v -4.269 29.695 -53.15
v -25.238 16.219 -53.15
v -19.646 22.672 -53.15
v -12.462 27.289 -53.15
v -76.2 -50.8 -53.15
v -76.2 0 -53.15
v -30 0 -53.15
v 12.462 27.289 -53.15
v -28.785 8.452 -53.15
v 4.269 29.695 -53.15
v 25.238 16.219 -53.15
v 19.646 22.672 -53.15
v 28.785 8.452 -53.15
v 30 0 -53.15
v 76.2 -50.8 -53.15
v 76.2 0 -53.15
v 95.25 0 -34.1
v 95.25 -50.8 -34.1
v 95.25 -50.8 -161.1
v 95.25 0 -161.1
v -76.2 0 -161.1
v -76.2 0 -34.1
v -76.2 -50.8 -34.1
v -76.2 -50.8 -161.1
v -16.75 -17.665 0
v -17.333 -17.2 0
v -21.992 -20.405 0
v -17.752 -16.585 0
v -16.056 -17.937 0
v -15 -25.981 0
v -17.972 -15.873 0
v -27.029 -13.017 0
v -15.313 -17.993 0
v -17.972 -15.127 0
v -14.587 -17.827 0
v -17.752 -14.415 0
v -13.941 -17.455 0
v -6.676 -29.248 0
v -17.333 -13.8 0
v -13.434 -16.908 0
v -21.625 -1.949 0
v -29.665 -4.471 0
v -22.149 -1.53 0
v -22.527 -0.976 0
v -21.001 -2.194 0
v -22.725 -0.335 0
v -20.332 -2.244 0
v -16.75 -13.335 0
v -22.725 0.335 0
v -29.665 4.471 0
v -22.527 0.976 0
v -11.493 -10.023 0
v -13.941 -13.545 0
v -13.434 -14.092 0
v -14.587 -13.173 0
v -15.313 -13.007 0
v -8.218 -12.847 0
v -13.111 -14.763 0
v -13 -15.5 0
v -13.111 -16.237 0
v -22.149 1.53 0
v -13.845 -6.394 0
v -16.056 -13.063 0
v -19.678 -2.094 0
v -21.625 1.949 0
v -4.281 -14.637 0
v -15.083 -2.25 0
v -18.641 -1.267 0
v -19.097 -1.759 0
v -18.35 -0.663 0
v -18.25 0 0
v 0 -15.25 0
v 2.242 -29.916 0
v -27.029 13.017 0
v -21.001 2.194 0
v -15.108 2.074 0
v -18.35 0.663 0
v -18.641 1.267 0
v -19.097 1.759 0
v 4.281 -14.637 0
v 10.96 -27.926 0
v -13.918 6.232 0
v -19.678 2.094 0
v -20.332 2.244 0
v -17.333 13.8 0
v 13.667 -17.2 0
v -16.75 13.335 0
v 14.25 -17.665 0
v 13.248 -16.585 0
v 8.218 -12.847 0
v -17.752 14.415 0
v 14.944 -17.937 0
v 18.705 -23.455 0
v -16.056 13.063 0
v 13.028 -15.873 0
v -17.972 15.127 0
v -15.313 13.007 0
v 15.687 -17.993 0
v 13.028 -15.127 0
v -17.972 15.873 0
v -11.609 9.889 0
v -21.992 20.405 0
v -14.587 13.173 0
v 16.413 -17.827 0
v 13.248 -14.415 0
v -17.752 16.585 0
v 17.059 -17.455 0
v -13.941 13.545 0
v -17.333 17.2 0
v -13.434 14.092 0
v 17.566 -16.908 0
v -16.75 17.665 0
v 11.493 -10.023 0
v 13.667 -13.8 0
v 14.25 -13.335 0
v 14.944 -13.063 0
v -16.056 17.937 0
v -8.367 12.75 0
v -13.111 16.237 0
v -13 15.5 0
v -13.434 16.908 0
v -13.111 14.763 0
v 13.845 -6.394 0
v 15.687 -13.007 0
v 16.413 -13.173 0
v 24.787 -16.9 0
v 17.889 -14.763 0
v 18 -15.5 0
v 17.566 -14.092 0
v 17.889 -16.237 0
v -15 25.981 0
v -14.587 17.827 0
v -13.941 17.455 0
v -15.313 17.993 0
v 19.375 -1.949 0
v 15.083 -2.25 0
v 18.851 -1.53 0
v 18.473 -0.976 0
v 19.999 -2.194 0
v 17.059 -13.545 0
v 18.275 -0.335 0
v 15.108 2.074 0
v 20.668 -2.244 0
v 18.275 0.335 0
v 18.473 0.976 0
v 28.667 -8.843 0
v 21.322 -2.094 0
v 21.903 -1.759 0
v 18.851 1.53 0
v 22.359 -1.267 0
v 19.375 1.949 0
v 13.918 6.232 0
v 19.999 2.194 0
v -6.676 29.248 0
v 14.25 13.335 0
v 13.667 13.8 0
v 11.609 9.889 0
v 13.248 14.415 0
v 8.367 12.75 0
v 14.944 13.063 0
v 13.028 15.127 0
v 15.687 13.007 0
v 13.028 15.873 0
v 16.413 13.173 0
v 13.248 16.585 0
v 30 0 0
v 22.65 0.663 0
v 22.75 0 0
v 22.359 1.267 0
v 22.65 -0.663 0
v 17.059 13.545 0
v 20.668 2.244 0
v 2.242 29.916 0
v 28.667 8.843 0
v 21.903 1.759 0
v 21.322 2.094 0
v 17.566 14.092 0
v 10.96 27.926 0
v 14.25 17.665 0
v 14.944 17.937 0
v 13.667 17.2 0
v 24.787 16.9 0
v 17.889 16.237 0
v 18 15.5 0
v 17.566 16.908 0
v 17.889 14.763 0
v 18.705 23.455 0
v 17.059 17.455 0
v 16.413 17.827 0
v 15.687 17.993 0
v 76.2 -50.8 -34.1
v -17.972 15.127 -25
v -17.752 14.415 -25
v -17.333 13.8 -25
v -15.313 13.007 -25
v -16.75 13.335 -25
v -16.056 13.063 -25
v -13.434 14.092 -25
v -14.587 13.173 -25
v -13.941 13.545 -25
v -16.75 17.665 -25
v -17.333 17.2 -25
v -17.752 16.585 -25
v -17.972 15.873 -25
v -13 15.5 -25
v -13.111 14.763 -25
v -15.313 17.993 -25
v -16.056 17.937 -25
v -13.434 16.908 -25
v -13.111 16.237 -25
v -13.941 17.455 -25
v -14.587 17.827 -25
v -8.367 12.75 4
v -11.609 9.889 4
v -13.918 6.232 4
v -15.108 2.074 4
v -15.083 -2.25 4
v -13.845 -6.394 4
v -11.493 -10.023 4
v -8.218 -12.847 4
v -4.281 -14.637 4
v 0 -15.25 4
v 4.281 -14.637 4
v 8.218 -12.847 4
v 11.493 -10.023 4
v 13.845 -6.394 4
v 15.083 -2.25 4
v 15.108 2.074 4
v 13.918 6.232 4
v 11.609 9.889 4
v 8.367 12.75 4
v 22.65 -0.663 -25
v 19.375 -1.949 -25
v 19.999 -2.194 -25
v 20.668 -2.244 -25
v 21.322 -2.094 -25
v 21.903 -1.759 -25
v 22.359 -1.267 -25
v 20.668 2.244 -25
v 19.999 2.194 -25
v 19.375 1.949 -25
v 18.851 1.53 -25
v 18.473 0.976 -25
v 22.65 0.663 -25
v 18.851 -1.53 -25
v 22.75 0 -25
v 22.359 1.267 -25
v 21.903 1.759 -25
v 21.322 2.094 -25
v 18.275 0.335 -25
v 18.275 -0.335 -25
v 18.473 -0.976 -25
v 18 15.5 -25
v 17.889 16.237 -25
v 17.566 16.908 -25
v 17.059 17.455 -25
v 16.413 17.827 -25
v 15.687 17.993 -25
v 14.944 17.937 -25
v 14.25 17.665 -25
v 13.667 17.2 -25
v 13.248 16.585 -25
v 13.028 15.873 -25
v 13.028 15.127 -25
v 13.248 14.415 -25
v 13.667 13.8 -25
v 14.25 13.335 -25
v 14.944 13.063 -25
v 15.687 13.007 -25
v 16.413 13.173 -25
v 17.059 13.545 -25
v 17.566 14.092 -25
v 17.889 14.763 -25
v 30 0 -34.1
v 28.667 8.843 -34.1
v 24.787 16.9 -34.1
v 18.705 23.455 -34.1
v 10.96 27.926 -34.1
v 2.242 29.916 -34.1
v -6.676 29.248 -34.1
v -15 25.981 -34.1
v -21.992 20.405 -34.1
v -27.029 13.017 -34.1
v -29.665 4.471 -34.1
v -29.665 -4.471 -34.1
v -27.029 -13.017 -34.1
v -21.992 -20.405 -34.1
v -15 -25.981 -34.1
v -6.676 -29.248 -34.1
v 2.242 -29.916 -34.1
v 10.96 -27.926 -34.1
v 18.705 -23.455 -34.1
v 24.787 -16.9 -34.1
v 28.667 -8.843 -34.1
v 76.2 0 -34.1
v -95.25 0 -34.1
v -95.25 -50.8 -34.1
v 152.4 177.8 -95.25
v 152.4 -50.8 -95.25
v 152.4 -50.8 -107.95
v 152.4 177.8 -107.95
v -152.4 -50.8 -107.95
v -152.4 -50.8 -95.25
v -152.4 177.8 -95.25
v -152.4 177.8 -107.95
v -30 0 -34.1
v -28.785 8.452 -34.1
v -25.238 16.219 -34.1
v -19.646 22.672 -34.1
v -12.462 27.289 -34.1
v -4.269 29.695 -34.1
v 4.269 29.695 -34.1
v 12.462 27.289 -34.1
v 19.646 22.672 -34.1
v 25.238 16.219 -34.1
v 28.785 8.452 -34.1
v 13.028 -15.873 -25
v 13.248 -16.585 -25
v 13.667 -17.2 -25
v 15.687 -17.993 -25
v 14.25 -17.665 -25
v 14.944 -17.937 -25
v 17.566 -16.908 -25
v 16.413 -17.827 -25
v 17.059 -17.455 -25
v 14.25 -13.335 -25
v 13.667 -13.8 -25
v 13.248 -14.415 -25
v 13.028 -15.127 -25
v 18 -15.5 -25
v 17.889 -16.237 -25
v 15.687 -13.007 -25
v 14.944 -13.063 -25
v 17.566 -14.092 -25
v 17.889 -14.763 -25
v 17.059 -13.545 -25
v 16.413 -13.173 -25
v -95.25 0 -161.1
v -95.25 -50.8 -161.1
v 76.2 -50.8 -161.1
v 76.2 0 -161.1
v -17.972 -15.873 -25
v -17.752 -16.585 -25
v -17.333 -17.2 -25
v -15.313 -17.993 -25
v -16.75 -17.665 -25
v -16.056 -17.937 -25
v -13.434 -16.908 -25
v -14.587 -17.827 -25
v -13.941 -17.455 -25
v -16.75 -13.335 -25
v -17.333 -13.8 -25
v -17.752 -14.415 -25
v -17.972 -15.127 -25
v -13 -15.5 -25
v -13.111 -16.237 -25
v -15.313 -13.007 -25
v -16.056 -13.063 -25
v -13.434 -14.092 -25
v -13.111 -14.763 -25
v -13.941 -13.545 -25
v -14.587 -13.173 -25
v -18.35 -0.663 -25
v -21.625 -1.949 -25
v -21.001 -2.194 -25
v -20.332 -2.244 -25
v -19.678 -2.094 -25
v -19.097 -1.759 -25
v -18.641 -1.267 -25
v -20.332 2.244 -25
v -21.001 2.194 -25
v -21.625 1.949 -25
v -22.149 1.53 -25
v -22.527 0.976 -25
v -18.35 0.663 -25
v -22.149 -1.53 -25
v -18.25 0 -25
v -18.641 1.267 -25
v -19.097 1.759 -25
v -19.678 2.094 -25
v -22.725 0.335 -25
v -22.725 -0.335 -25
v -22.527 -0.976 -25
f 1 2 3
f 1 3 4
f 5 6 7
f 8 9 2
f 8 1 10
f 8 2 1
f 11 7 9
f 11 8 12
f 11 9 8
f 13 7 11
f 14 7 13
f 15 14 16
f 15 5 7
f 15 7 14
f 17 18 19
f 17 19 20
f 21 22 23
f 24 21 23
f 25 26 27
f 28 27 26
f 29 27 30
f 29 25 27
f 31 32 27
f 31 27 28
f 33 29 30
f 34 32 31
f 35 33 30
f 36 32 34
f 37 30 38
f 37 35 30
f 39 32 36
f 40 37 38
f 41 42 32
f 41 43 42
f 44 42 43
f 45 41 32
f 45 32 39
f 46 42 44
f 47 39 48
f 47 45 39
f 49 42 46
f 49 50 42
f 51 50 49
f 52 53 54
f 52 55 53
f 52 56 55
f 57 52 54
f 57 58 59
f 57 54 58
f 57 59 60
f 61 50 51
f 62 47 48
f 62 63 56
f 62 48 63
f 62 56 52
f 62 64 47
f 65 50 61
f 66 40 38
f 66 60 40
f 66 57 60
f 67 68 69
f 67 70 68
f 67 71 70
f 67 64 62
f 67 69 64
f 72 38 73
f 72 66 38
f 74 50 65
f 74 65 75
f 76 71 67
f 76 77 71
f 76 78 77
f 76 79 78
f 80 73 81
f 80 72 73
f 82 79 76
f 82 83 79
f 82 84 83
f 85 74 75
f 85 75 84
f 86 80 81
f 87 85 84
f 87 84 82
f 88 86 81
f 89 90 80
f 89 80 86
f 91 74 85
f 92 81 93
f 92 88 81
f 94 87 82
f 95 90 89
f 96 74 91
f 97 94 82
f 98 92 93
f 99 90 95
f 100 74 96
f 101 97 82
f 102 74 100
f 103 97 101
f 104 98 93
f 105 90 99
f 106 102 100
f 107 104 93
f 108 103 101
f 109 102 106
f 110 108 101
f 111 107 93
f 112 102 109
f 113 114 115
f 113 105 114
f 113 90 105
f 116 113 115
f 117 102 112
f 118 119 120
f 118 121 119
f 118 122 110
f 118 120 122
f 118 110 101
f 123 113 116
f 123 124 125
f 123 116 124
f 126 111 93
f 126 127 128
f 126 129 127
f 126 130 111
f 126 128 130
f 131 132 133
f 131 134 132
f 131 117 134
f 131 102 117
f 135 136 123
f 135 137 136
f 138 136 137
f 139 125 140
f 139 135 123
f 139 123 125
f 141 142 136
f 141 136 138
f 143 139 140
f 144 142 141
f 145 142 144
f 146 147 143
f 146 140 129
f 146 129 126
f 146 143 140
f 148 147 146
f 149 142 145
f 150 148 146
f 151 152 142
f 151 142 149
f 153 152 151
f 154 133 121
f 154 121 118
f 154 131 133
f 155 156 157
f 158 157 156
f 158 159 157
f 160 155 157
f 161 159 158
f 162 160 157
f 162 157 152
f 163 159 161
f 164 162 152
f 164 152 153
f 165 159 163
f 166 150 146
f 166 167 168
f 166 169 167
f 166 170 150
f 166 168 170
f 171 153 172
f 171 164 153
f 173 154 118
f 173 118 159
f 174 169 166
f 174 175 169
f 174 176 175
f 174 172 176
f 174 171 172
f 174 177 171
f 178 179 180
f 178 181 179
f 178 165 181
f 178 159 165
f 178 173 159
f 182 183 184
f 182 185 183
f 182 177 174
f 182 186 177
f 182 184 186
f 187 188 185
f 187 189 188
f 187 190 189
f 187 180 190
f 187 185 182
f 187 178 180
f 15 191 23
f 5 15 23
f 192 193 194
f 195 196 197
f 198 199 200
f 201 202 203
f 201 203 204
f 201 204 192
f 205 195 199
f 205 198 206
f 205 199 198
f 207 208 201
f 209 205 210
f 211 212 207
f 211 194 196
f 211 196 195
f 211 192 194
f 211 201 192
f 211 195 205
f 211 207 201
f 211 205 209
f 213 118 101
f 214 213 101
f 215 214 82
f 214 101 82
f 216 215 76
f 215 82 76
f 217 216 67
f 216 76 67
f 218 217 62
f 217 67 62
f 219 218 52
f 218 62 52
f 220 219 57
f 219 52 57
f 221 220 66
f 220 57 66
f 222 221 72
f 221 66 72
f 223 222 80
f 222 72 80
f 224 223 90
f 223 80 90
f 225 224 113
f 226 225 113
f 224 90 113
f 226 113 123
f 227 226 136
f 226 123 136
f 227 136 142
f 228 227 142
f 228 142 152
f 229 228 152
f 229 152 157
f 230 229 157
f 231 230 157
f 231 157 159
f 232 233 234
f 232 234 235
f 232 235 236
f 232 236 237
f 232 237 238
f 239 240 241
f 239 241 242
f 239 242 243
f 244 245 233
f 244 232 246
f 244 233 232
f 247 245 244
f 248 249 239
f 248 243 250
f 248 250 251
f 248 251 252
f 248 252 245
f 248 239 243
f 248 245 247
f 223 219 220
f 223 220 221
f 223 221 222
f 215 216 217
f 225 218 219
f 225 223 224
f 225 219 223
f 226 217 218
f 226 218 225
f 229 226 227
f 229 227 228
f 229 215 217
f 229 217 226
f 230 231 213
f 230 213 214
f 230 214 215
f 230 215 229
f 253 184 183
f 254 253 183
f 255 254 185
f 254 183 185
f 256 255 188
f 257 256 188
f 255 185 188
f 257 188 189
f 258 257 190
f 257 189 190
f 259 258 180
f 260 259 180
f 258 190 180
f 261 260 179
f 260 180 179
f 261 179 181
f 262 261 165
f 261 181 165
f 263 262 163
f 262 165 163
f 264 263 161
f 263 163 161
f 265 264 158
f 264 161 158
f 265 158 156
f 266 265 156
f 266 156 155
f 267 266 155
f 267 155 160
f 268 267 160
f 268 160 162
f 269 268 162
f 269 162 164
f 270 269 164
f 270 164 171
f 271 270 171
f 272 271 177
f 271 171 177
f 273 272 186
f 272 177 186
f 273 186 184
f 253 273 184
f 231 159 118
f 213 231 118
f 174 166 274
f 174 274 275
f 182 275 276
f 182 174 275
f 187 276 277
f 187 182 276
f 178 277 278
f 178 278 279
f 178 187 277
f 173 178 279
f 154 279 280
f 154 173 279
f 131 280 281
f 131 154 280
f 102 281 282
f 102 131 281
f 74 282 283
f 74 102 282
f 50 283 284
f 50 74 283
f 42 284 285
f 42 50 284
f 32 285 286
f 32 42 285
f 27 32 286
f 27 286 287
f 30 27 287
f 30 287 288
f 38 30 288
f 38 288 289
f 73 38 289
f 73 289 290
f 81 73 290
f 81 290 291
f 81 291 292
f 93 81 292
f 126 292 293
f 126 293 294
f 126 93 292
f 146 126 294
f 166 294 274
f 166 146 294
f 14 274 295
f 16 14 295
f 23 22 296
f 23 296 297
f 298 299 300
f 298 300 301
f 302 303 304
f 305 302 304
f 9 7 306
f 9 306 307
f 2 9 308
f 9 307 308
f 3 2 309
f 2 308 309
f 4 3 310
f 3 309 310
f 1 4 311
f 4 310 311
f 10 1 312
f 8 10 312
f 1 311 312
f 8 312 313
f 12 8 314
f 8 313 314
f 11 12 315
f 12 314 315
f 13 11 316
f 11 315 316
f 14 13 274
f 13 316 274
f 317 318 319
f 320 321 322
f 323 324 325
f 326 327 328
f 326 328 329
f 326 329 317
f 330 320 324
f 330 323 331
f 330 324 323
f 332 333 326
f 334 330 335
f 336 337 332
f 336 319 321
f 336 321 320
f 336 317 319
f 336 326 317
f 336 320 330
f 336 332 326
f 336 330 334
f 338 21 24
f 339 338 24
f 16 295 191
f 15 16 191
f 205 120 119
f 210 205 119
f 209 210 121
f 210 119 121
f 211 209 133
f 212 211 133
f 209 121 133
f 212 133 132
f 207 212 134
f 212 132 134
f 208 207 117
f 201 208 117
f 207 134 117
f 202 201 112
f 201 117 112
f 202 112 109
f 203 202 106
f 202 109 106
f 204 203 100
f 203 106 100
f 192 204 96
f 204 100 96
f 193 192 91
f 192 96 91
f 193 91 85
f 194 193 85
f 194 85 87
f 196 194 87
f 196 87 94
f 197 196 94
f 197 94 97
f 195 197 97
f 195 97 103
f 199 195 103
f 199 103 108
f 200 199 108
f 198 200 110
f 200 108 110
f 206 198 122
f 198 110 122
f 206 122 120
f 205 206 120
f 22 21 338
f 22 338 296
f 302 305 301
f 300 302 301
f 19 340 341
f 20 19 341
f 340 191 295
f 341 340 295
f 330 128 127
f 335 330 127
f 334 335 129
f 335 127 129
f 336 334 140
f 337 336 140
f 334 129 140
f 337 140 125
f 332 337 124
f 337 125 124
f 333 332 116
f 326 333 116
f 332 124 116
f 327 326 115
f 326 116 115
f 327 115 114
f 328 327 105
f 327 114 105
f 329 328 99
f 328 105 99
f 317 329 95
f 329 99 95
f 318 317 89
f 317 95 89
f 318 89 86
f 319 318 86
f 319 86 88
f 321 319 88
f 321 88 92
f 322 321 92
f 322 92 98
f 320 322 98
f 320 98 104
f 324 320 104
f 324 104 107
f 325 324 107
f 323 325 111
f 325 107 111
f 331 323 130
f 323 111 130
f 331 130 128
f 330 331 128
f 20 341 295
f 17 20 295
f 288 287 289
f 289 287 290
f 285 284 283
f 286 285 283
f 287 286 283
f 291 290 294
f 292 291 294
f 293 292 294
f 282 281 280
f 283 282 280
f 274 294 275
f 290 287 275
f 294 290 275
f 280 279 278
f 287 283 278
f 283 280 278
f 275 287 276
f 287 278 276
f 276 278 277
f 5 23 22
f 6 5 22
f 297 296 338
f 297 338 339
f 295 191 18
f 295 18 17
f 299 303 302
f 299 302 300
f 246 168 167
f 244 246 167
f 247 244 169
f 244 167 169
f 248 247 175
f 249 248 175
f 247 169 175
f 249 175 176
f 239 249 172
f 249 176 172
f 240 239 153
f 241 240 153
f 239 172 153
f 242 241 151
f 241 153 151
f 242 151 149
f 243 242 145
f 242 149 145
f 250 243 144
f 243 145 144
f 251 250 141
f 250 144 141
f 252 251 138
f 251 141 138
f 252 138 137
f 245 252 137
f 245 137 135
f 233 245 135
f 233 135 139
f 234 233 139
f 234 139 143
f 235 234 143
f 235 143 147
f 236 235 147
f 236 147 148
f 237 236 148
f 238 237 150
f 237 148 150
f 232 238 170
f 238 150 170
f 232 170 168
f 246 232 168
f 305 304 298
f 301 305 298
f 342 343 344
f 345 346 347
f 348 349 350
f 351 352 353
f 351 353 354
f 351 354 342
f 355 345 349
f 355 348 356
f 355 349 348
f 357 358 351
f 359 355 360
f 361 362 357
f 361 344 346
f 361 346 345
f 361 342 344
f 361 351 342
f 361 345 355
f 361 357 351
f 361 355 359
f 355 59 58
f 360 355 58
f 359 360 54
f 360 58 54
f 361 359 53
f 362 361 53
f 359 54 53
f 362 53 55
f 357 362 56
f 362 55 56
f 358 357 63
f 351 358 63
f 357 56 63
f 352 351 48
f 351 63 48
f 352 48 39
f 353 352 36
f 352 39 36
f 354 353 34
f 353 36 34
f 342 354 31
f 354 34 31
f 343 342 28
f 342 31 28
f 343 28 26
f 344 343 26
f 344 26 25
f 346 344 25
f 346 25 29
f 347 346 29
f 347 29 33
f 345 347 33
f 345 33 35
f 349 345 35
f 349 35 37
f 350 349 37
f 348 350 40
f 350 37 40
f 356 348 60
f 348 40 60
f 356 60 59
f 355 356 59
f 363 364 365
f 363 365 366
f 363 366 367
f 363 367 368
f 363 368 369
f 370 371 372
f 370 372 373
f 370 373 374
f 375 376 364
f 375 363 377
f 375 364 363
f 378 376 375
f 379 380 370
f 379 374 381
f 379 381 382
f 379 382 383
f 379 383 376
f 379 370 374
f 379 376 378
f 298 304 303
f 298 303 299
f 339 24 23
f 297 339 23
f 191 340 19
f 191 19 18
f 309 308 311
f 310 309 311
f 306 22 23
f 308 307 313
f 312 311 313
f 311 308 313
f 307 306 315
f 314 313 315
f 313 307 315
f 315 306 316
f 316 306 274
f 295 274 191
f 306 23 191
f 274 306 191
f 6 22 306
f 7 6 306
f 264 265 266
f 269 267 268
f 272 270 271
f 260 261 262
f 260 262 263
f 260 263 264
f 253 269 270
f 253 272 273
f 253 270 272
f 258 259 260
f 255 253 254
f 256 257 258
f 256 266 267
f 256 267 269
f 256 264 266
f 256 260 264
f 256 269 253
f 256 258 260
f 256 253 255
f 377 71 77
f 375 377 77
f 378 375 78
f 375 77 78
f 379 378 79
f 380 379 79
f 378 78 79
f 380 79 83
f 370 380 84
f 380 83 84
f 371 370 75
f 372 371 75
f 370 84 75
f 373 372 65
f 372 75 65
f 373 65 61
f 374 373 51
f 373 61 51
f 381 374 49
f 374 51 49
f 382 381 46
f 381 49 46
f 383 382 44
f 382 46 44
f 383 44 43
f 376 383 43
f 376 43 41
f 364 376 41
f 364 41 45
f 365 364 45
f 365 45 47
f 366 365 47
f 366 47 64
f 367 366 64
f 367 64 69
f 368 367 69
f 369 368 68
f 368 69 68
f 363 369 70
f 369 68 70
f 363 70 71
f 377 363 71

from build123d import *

# Parameters (mm, degrees)
F0_R      = 30
F1_DEPTH  = 34.1
F3_DEPTH  = 4
F4_R      = 2.5
F4_R_2    = 2.25
F5_DEPTH  = 25
F7_DEPTH  = 19.05
F8_W      = 50.8
F8_H      = 127
F9_DEPTH  = 19.05
F10_W     = 50.8
F10_H     = 127
F11_DEPTH = 19.05
F13_W     = 304.8
F13_H     = 228.6
F14_DEPTH = 12.7


with BuildPart() as f1:
    # F0 (on Top) → F1 (new body)
    with BuildSketch(Plane.XY):
        Circle(F0_R)
    extrude(amount=-F1_DEPTH)

    # F2 (on face) → F3 (join)
    with BuildSketch(Plane.XY):
        with BuildLine():
            Line((8.3666002653, 12.75), (-8.3666002653, 12.75))
            ThreePointArc((-8.3666002653, 12.75), (0, -15.25), (8.3666002653, 12.75))
        make_face()
    extrude(amount=F3_DEPTH)

    # F4 (on face) → F5 (cut)
    with BuildSketch(Plane.XY):
        with Locations((15.5, 15.5)):
            Circle(F4_R)
        with Locations((-15.5, 15.5)):
            Circle(F4_R)
        with Locations((-15.5, -15.5)):
            Circle(F4_R)
        with Locations((15.5, -15.5)):
            Circle(F4_R)
        with Locations((-20.5, 0)):
            Circle(F4_R_2)
        with Locations((20.5, 0)):
            Circle(F4_R_2)
    extrude(amount=-F5_DEPTH, mode=Mode.SUBTRACT)


with BuildPart() as f7:
    # F6 (on face) → F7 (new body)
    with BuildSketch(Plane(origin=(0, 0, -34.1), x_dir=(1, 0, 0), z_dir=(0, 0, -1))):
        with BuildLine():
            ThreePointArc((-30, 0), (0, 30), (30, 0))
            Line((30, 0), (76.2, 0))
            Line((76.2, 0), (76.2, 50.8))
            Line((76.2, 50.8), (-76.2, 50.8))
            Line((-76.2, 50.8), (-76.2, 0))
            Line((-76.2, 0), (-30, 0))
        make_face()
        with BuildLine():
            ThreePointArc((-30, 0), (0, -30), (30, 0))
            Line((30, 0), (-30, 0))
        make_face()
        with BuildLine():
            Line((-30, 0), (30, 0))
            ThreePointArc((30, 0), (0, 30), (-30, 0))
        make_face()
    extrude(amount=F7_DEPTH)


with BuildPart() as f9:
    # F8 (on face) → F9 (new body)
    with BuildSketch(Plane.YZ.offset(76.2)):
        with Locations((-25.4, -97.6)):
            Rectangle(F8_W, F8_H)
    extrude(amount=F9_DEPTH)


with BuildPart() as f11:
    # F10 (on face) → F11 (new body)
    with BuildSketch(Plane(origin=(-76.2, 0, 0), x_dir=(0, -1, 0), z_dir=(-1, 0, 0))):
        with Locations((25.4, -97.6)):
            Rectangle(F10_W, F10_H)
    extrude(amount=F11_DEPTH)


with BuildPart() as f14:
    # F13 (on offset) → F14 (new body)
    with BuildSketch(Plane.XY.offset(-95.25)):
        with Locations((0, 63.5)):
            Rectangle(F13_W, F13_H)
    extrude(amount=-F14_DEPTH)


solid = Compound([f1.part, f7.part, f9.part, f11.part, f14.part])
